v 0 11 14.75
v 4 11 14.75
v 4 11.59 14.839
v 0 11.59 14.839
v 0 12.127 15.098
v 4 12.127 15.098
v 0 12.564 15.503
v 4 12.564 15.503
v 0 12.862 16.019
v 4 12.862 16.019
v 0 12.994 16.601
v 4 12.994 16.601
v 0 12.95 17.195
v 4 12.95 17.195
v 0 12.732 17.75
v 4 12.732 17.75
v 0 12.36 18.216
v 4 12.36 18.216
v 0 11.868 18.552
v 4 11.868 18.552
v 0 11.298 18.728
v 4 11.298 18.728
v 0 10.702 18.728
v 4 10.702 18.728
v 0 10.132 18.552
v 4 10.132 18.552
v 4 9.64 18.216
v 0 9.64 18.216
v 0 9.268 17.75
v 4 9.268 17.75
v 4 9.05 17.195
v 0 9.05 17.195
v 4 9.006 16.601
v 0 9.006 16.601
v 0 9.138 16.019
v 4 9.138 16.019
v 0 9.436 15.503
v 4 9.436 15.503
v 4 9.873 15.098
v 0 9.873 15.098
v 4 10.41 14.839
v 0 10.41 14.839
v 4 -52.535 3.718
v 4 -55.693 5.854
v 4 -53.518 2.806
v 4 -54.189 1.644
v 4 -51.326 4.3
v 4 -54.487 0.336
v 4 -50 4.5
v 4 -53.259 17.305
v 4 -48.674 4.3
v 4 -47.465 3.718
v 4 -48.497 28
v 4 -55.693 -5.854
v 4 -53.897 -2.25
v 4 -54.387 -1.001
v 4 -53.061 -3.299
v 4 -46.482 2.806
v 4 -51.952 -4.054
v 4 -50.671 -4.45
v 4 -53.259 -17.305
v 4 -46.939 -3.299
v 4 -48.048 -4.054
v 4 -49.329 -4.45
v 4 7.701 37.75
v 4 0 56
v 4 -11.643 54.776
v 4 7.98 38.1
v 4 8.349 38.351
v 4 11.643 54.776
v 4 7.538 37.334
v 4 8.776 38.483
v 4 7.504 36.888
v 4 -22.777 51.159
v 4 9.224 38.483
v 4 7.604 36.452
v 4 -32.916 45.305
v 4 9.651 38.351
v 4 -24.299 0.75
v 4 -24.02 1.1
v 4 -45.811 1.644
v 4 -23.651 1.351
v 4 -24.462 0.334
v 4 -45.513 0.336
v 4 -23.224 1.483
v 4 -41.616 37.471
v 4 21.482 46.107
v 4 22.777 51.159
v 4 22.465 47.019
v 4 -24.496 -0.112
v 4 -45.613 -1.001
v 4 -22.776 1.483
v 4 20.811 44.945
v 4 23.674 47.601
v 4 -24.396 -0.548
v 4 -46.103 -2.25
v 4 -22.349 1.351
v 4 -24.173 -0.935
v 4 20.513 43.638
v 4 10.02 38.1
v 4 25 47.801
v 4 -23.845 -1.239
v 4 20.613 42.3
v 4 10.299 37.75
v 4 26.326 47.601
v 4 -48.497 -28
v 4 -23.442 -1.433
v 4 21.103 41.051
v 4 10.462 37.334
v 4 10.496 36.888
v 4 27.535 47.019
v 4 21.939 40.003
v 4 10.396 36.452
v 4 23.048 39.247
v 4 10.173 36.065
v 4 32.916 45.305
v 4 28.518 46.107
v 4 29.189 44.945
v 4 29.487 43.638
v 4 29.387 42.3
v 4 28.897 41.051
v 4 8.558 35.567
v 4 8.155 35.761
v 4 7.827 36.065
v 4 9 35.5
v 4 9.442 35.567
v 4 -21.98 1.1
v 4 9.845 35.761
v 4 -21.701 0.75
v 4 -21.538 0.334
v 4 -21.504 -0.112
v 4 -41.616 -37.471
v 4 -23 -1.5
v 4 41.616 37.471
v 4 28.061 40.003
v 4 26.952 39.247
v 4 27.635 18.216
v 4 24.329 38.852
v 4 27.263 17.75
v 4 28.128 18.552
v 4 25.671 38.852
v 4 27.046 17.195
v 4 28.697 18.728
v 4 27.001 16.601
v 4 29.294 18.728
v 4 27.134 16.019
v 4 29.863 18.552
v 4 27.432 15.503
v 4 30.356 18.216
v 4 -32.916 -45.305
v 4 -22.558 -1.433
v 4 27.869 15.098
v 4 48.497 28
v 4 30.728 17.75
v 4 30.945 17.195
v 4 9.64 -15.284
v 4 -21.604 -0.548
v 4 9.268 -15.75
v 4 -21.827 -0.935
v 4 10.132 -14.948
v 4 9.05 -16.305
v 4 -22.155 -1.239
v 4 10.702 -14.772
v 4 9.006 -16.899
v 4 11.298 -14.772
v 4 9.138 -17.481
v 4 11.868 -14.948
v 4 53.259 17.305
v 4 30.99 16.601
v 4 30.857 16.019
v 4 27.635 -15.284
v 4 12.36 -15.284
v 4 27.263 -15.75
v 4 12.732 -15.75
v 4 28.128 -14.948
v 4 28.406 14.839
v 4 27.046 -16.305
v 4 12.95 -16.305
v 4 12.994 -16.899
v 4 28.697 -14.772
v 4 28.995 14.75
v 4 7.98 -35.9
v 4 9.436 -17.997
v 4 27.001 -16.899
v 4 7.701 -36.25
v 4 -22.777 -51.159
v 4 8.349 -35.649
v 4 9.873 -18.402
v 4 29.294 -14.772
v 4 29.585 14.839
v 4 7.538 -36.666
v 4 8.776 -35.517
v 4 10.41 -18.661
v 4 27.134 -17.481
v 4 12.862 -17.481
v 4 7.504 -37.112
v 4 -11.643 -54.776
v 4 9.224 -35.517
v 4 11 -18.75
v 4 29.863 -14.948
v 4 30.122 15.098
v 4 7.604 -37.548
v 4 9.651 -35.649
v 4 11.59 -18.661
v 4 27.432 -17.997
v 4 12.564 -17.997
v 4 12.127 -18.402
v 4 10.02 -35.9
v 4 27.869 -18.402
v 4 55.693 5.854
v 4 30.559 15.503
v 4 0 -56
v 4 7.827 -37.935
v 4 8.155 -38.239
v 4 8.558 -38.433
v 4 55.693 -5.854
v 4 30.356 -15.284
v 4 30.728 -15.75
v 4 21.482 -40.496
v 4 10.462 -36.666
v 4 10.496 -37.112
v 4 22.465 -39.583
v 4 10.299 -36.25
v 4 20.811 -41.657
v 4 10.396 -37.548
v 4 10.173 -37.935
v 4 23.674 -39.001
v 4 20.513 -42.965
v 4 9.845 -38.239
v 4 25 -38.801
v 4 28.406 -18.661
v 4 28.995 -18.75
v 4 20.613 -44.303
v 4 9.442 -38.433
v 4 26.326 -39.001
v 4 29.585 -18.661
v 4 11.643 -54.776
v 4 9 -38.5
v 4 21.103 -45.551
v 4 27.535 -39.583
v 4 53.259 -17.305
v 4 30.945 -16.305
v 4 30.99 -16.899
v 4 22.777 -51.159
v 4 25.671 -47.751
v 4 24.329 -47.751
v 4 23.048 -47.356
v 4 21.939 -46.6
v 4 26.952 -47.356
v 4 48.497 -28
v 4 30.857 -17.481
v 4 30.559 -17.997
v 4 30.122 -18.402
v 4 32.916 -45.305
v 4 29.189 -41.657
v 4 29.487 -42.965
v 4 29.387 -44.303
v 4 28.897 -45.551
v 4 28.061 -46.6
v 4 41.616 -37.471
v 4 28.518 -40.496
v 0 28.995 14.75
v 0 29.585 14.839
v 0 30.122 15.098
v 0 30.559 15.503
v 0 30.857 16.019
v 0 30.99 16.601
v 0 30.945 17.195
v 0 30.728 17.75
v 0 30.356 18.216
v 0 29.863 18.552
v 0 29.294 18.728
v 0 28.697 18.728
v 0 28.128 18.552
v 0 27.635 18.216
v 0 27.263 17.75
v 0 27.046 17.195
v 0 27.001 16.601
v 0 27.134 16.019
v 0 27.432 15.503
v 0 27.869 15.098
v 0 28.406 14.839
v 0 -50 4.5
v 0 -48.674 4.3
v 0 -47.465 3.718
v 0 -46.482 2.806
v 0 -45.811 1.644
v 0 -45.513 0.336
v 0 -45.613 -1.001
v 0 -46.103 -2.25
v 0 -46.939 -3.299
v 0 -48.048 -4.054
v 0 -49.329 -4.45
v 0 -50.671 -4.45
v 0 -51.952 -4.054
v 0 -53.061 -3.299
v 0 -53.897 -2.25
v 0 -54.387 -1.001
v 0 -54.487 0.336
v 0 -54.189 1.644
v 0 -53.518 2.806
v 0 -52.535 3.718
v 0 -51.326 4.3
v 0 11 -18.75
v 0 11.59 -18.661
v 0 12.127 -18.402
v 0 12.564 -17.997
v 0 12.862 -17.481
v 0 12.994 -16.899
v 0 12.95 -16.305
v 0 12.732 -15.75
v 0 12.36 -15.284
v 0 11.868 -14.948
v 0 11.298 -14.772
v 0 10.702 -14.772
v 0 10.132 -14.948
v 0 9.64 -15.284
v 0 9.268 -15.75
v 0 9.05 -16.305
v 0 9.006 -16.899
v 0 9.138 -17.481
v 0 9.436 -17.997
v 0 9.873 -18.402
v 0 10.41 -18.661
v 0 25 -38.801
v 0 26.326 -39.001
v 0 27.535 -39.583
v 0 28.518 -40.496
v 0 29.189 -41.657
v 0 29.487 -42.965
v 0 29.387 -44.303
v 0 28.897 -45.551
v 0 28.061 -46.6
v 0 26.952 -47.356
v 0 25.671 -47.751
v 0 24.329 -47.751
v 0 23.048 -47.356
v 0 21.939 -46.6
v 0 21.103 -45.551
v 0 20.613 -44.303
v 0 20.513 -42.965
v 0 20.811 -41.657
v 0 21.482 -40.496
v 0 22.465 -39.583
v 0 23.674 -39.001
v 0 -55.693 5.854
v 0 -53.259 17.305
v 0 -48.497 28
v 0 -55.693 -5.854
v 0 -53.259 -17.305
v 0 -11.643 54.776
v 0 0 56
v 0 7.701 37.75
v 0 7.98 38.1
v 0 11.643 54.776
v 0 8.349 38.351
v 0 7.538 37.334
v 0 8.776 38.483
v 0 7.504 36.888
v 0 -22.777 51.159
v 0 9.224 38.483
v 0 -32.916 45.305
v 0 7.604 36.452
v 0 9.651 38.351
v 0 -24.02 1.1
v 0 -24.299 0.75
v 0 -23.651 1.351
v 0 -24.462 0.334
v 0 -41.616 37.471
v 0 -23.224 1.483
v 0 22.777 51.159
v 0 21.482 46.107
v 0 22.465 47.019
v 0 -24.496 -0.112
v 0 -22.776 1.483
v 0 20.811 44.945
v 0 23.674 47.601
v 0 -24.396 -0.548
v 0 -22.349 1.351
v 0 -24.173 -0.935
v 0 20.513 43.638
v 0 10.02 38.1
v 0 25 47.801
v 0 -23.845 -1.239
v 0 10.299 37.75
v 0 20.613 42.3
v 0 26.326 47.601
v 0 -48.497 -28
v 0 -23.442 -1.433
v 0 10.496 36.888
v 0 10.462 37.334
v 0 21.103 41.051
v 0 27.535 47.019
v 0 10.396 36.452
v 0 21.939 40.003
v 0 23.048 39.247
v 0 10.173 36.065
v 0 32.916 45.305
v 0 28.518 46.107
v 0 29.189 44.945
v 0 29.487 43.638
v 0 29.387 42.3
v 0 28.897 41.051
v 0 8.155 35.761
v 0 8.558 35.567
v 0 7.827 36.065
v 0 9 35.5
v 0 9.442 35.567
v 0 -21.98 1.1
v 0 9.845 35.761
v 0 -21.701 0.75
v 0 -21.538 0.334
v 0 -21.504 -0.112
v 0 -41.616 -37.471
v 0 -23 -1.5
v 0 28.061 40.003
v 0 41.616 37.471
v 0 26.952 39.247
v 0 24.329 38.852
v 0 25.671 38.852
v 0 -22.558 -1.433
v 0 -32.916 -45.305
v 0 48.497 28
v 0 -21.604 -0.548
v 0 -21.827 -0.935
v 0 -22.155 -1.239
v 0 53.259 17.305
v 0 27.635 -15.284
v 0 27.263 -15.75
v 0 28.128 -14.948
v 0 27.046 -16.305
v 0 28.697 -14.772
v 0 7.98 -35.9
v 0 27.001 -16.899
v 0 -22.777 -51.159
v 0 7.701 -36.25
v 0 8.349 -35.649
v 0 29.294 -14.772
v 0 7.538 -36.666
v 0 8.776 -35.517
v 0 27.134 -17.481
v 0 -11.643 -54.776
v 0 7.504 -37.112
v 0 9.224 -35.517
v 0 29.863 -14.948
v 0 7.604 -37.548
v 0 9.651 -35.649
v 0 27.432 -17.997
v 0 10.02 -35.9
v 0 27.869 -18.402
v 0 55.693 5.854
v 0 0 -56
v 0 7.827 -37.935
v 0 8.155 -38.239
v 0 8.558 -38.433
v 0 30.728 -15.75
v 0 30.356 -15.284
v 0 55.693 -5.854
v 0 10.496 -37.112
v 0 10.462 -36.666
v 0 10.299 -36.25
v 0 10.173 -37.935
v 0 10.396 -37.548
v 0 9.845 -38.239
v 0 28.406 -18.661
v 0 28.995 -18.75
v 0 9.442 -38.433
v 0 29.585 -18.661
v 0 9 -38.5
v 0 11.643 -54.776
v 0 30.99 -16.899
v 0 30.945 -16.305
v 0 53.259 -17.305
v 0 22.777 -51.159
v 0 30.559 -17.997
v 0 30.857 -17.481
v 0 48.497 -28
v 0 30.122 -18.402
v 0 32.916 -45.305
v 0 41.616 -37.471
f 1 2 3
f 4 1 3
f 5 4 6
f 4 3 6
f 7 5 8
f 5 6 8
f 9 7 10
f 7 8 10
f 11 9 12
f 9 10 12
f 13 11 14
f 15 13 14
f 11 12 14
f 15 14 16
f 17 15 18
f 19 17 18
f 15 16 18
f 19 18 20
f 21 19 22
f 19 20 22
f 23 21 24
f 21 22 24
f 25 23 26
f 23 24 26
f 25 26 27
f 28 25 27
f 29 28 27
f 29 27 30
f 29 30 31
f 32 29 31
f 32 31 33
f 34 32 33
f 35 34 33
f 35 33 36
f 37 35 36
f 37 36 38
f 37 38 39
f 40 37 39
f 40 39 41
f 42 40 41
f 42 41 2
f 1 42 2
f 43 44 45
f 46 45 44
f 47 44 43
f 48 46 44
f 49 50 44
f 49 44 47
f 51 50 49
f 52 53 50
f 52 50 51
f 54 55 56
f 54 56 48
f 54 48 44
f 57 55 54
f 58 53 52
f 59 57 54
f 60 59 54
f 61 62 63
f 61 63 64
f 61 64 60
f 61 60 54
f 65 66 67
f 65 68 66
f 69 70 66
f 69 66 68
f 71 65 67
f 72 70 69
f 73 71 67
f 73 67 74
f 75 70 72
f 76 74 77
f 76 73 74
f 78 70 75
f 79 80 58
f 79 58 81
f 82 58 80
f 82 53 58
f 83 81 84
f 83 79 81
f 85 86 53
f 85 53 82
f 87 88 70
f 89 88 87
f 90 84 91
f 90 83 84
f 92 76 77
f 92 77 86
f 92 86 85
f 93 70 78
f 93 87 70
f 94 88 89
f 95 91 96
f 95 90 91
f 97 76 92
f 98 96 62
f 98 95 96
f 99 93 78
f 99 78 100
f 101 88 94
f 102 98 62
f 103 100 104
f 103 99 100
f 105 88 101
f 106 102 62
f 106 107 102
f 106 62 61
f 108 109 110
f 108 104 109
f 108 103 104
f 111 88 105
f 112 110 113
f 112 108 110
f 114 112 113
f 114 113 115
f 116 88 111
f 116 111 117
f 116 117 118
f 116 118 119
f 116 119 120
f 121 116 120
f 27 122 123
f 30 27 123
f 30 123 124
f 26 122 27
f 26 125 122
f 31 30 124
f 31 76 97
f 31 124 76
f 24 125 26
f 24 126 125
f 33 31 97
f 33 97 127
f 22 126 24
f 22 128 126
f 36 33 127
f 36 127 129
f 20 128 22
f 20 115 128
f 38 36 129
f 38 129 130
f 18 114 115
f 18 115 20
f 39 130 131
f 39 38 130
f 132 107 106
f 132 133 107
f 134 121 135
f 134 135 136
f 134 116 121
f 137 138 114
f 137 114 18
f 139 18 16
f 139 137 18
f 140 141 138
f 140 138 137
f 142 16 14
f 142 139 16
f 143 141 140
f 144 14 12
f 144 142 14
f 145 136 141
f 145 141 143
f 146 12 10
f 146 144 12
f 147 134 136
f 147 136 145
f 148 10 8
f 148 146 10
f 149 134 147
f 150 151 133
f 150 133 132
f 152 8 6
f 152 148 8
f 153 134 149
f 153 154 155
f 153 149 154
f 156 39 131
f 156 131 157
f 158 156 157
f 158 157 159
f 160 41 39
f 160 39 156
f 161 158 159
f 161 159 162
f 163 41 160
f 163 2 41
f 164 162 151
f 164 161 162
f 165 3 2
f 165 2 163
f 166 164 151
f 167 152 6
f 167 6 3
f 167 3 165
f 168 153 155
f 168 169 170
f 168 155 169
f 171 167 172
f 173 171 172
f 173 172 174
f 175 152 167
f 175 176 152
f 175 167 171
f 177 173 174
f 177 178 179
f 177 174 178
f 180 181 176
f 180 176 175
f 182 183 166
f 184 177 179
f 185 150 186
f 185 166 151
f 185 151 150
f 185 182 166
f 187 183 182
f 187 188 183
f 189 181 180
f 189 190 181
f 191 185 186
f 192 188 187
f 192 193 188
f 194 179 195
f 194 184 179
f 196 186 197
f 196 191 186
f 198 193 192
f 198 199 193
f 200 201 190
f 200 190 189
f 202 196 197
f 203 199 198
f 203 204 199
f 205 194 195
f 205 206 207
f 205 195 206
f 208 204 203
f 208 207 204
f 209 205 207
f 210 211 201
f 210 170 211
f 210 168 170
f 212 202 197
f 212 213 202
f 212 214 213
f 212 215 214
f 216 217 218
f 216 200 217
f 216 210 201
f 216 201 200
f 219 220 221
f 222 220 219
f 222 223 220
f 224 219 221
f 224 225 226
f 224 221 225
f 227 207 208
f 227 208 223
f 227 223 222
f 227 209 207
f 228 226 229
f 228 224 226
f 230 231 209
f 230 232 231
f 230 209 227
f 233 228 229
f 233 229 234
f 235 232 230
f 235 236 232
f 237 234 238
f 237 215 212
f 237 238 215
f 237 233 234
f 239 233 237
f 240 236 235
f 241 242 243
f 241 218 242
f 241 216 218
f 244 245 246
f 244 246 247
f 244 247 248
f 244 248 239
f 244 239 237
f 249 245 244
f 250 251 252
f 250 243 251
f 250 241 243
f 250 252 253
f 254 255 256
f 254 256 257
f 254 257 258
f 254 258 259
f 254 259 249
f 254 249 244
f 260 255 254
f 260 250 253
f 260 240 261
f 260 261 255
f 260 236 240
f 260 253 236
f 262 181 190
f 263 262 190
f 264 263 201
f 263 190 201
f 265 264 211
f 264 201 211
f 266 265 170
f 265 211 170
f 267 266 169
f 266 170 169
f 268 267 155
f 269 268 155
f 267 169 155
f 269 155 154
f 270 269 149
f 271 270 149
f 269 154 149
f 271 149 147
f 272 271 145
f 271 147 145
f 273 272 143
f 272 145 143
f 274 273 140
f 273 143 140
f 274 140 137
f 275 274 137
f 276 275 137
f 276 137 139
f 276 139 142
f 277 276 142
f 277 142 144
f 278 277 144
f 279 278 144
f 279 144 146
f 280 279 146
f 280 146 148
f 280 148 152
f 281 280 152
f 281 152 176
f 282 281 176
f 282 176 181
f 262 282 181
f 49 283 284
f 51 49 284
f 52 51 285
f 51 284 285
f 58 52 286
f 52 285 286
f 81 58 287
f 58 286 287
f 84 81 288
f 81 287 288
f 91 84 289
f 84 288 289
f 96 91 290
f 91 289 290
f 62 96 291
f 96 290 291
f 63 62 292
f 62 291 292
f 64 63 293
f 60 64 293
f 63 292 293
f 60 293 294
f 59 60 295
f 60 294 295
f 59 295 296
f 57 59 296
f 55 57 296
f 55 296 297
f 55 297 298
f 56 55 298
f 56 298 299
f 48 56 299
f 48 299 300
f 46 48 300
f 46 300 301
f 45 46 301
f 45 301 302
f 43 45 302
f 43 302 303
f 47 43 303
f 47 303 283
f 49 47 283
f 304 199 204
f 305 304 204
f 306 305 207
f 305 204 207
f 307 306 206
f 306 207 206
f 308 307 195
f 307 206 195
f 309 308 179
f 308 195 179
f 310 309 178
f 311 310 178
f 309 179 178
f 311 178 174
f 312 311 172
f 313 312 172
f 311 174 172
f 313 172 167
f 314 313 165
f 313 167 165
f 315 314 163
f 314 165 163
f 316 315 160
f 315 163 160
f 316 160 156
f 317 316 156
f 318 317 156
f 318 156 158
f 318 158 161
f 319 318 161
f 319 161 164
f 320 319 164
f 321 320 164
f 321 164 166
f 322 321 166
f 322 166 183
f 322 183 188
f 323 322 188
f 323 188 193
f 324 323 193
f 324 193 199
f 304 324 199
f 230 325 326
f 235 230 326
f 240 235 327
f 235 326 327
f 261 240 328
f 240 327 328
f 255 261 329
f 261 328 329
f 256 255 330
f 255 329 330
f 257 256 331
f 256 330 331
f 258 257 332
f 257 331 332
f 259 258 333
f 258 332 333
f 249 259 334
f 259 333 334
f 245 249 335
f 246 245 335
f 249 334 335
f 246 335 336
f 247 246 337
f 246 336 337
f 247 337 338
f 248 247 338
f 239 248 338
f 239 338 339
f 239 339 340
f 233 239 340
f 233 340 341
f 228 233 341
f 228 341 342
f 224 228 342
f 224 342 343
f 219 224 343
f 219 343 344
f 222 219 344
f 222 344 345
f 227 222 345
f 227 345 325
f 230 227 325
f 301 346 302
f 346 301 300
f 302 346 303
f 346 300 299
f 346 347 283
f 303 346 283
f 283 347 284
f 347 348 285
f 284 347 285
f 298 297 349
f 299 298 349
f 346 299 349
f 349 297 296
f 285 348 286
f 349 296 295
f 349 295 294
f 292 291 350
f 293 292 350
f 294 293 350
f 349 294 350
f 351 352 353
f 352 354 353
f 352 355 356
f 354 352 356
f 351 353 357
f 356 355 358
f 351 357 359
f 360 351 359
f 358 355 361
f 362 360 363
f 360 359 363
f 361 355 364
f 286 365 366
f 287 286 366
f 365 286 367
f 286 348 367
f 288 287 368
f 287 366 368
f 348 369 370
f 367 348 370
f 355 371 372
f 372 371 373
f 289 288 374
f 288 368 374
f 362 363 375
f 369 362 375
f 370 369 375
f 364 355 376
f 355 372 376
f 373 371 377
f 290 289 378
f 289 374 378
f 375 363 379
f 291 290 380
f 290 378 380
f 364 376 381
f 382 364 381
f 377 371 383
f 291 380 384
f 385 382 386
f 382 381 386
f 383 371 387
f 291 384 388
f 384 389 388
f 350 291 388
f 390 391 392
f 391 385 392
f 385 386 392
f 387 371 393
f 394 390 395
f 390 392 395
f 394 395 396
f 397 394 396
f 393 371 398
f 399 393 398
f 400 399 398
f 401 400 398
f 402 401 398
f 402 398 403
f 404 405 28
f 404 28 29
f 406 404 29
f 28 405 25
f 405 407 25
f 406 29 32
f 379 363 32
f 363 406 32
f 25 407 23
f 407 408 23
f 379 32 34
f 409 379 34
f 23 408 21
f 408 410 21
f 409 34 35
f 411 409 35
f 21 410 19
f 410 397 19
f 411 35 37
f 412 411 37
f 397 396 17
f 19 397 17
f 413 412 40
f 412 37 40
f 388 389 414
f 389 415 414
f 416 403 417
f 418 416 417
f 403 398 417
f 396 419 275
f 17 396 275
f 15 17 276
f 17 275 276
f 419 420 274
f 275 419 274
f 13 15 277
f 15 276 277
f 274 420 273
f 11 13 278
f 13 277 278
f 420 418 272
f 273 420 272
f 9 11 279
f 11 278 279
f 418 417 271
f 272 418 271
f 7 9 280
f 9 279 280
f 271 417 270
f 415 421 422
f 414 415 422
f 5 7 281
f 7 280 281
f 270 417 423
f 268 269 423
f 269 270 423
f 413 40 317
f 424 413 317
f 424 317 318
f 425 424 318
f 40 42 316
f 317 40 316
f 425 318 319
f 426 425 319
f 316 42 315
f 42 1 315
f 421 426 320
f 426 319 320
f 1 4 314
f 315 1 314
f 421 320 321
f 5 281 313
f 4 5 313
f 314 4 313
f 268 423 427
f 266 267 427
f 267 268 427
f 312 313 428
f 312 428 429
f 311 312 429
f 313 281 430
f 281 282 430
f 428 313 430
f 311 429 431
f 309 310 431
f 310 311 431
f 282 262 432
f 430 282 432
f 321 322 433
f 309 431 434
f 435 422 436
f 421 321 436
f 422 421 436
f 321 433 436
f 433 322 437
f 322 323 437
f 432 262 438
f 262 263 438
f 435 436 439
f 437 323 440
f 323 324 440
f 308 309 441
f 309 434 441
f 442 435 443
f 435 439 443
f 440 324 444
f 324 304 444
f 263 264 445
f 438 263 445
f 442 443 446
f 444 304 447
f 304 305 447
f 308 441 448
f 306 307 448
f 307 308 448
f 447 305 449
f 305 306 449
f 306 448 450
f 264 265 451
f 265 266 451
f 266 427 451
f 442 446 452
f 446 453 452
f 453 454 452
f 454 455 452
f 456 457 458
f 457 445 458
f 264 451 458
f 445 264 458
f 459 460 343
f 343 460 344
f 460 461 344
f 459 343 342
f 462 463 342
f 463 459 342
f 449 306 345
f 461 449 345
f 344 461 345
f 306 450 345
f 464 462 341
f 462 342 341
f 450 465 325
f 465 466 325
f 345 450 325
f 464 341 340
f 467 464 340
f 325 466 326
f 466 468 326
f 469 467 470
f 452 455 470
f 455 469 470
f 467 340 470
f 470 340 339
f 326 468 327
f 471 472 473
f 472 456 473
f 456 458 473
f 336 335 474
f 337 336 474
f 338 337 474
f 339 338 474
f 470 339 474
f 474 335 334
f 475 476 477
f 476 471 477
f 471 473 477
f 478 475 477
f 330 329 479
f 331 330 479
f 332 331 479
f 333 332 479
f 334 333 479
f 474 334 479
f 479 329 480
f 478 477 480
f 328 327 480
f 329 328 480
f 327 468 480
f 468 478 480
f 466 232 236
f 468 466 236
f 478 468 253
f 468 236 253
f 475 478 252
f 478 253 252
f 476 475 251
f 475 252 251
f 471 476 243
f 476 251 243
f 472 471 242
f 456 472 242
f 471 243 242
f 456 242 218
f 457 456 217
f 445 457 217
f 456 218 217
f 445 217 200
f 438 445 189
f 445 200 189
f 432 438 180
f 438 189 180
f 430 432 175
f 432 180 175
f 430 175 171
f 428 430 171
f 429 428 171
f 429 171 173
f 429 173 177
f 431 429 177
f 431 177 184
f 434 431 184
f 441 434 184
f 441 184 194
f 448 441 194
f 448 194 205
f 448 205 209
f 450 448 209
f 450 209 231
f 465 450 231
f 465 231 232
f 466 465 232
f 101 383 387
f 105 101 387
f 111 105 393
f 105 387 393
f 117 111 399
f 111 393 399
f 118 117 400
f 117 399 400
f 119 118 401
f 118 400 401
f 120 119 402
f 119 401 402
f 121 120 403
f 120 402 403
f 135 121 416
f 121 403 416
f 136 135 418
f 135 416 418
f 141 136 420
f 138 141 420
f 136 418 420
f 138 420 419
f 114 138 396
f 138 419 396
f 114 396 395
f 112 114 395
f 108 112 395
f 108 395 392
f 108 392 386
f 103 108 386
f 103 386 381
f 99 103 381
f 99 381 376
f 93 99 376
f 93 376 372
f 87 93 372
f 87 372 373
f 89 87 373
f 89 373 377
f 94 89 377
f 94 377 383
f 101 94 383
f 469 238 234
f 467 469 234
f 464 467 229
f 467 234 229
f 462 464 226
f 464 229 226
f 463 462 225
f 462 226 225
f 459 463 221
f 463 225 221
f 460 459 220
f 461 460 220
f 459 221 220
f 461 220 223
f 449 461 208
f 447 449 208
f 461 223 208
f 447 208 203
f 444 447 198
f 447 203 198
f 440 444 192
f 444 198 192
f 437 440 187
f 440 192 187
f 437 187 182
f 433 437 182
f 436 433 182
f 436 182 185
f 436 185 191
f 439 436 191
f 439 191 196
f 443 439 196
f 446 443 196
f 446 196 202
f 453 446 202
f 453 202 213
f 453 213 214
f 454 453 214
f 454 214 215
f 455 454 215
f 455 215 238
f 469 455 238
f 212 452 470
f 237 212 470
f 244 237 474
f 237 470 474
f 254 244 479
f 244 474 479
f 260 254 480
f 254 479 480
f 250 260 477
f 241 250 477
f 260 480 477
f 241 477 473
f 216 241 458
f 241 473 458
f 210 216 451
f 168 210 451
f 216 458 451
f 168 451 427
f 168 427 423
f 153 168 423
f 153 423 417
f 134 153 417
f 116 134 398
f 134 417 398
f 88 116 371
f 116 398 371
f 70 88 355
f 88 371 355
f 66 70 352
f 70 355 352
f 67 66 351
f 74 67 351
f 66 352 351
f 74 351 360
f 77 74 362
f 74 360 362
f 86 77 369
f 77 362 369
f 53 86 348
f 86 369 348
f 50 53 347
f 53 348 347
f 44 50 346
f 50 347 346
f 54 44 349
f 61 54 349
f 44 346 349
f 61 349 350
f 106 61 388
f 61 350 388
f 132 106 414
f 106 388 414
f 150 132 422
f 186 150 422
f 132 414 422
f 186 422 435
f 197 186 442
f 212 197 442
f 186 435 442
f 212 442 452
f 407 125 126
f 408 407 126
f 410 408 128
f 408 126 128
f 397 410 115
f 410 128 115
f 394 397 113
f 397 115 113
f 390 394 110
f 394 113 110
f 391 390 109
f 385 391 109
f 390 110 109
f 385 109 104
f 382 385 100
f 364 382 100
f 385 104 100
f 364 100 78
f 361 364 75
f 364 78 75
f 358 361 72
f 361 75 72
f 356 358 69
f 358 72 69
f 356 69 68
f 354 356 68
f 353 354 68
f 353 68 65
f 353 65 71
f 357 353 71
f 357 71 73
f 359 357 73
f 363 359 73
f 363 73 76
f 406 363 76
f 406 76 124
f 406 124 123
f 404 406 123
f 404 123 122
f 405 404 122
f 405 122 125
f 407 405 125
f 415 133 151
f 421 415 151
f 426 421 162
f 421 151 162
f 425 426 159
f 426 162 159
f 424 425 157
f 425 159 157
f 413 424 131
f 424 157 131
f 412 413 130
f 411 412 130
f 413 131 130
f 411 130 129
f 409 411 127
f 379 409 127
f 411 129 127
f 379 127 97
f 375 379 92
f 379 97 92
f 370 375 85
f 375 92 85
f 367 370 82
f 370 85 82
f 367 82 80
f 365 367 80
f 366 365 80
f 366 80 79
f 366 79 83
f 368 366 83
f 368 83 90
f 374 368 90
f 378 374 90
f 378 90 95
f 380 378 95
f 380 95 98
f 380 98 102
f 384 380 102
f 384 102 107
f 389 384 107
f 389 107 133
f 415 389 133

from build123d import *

# Parameters (mm, degrees)
SKETCH1_R           = 56
BOSS_EXTRUDE1_DEPTH = 4
SKETCH2_R           = 4.5
CUT_EXTRUDE1_DEPTH  = 80.296910406
SKETCH4_R           = 2
SKETCH4_R_2         = 1.5
CUT_EXTRUDE3_DEPTH  = 80.296910406


with BuildPart() as part:
    # Sketch1 → Boss-Extrude1 (new body)
    with BuildSketch(Plane(origin=(0, 0, 0), x_dir=(0, 0, -1), z_dir=(1, 0, 0))):
        Circle(SKETCH1_R)
    extrude(amount=BOSS_EXTRUDE1_DEPTH)

    # Sketch2 → Cut-Extrude1 (cut, through all)
    with BuildSketch(Plane.ZY):
        with Locations((-43.301270189, 25)):
            Circle(SKETCH2_R)
        with Locations((43.301270189, 25)):
            Circle(SKETCH2_R)
        with Locations((0, -50)):
            Circle(SKETCH2_R)
    extrude(amount=-CUT_EXTRUDE1_DEPTH, mode=Mode.SUBTRACT)

    # Sketch4 → Cut-Extrude3 (cut, through all)
    with BuildSketch(Plane(origin=(4, 0, 0), x_dir=(0, 0, -1), z_dir=(1, 0, 0))):
        with Locations((-16.75, 28.995494219)):
            Circle(SKETCH4_R)
        with Locations((16.75, 28.995494219)):
            Circle(SKETCH4_R)
        with Locations((16.75, 11)):
            Circle(SKETCH4_R)
        with Locations((-16.75, 11)):
            Circle(SKETCH4_R)
        with Locations((-37, 9)):
            Circle(SKETCH4_R_2)
        with Locations((0, -23)):
            Circle(SKETCH4_R_2)
        with Locations((37, 9)):
            Circle(SKETCH4_R_2)
    extrude(amount=-CUT_EXTRUDE3_DEPTH, mode=Mode.SUBTRACT)


solid = part.part
